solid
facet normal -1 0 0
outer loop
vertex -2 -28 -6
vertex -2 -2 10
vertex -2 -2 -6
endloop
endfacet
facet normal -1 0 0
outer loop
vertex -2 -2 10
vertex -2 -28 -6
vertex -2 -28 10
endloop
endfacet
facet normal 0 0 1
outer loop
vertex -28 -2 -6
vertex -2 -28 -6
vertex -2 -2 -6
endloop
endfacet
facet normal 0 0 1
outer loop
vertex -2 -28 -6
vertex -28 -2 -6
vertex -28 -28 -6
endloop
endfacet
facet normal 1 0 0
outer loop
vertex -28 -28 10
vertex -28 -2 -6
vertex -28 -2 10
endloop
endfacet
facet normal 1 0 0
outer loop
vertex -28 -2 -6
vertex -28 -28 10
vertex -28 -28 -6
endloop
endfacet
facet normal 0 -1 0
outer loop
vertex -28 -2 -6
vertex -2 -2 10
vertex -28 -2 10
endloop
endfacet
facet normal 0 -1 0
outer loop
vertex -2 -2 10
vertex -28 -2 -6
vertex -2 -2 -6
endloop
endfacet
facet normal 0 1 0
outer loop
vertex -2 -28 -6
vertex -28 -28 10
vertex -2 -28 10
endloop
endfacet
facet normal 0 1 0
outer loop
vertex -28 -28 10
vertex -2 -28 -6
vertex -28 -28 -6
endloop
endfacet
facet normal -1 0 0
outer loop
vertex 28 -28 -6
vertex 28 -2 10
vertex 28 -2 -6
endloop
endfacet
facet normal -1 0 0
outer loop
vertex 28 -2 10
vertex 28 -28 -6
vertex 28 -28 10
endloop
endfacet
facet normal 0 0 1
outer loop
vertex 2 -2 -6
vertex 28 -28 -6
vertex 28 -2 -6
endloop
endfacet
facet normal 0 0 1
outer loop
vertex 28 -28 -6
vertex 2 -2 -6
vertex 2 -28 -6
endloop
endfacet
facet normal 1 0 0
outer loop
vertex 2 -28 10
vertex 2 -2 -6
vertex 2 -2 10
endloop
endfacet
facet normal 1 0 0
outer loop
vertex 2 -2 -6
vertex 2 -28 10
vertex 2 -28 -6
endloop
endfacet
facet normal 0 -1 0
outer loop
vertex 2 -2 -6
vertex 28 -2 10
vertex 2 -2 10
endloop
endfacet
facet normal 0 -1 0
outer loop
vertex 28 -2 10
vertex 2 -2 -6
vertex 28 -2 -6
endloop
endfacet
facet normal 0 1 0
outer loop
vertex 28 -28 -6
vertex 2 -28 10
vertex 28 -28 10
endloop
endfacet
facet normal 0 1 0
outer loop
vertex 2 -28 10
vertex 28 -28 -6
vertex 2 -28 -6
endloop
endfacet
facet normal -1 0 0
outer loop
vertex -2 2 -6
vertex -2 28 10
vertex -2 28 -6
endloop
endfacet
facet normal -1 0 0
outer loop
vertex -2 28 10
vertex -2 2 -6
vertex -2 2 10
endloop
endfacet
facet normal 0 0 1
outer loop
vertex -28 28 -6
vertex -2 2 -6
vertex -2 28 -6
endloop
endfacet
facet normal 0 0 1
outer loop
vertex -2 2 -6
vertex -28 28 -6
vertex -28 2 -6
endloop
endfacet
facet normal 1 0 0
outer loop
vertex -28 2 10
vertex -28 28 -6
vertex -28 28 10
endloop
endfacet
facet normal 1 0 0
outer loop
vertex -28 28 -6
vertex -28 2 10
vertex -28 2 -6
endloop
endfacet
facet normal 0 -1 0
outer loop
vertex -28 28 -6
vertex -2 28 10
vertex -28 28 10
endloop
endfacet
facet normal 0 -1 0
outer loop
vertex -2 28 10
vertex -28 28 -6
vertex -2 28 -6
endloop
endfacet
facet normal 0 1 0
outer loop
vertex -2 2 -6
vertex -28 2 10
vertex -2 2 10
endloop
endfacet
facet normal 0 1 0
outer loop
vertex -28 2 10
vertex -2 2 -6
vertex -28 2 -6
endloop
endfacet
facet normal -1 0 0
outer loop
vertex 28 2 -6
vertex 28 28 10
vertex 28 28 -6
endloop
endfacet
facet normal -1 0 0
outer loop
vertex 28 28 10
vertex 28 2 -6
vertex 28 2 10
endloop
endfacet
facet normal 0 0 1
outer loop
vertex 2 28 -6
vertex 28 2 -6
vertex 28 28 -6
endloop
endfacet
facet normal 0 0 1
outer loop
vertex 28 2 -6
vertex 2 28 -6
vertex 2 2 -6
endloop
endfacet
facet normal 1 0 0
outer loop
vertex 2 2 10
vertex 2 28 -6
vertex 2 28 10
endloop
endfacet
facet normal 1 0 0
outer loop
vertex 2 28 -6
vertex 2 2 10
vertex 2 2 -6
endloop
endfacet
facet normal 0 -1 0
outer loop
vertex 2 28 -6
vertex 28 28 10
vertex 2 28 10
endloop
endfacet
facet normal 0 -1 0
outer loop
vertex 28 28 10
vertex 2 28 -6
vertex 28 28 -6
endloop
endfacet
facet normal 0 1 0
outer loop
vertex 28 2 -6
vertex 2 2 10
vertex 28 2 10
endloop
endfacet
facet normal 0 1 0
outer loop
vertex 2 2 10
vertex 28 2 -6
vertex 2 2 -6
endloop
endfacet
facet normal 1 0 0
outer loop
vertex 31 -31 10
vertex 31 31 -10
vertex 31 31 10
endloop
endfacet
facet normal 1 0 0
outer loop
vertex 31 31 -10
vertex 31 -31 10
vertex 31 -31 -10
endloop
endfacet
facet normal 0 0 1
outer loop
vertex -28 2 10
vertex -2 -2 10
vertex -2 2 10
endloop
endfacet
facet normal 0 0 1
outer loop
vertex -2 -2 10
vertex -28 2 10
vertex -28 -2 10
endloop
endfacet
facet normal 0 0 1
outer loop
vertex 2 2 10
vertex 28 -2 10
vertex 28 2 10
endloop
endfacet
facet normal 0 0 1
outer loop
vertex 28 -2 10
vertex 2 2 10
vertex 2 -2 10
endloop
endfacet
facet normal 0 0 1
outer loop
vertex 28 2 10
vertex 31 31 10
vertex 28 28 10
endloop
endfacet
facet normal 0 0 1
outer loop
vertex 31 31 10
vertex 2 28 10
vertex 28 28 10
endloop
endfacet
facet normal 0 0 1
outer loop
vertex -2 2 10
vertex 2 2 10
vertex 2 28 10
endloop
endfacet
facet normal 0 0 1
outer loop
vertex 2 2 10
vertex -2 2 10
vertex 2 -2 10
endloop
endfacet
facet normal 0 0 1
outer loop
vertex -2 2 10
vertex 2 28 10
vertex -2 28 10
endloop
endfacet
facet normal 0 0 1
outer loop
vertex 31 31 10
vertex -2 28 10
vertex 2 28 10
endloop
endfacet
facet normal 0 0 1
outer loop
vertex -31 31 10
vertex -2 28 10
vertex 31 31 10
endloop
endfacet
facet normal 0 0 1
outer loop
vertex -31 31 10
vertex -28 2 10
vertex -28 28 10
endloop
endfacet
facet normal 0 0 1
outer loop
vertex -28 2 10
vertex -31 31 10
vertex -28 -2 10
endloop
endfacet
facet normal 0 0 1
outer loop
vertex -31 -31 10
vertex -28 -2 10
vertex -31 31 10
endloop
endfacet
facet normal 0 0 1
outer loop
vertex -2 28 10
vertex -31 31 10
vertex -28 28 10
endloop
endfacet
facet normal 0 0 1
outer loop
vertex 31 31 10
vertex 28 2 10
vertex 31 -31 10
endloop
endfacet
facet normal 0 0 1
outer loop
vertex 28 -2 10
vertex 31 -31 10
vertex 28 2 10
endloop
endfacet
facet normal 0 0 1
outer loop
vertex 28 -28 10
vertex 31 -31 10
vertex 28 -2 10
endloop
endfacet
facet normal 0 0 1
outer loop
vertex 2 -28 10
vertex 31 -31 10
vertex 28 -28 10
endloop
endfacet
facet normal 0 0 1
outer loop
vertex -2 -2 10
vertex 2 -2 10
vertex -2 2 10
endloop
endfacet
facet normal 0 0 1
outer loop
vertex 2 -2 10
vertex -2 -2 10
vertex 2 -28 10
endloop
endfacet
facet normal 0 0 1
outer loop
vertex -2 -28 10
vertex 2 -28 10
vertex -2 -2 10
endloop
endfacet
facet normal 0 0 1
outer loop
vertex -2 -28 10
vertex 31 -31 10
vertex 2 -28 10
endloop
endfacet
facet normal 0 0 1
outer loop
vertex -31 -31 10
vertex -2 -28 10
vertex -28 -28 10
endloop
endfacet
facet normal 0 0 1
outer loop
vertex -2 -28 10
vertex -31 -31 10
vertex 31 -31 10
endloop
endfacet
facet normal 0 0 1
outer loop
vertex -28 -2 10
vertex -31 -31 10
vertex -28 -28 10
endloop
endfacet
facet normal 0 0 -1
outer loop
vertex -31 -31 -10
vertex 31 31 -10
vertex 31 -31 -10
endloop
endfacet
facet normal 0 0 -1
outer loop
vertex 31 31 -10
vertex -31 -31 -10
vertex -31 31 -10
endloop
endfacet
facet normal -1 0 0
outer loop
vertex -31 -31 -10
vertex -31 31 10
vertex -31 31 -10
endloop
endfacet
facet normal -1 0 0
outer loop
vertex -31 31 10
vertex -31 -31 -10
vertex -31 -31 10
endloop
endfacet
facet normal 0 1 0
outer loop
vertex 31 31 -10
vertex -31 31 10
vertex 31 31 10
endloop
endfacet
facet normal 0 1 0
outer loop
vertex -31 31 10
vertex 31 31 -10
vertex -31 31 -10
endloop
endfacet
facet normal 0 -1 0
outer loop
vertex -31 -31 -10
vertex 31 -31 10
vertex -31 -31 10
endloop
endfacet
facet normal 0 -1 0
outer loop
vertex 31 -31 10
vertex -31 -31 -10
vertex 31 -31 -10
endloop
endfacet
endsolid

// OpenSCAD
$fn = 32;

// ----------------------------------------------------------------------
// Pocket plate 62 x 62 x 20
// 2 x 2 pockets 26 mm square, 16 mm deep
// ----------------------------------------------------------------------

// --- parameters (mm) ---
thickness = 20;  // plate thickness
floor_t = 4;     // material left under each pocket
pocket = 26;     // pocket side length
pitch_x = 30;    // pocket pitch along X
pitch_y = 30;    // pocket pitch along Y
cols = 2;        // pockets per row
rows = 2;        // rows of pockets

// --- derived feature positions (mm) ---
depth = thickness - floor_t;        // = 16   pocket depth, down to the floor
span_x = (cols - 1) * pitch_x;      // = 30   distance between outer pockets
span_y = (rows - 1) * pitch_y;      // = 30   distance between outer pocket rows
origin_x = -span_x / 2;             // = -15   X of the first pocket
origin_y = -span_y / 2;             // = -15   Y of the first pocket
plate = [span_x + pocket + 6, span_y + pocket + 6, thickness];  // = [62, 62, 20]   overall size: pockets plus 3 mm of wall on each side
feature_centers = [
  [origin_x + 0 * pitch_x, origin_y + 0 * pitch_y],
  [origin_x + 1 * pitch_x, origin_y + 0 * pitch_y],
  [origin_x + 0 * pitch_x, origin_y + 1 * pitch_y],
  [origin_x + 1 * pitch_x, origin_y + 1 * pitch_y]
];   // pocket centres, used verbatim by the cutter loop

// plate outline, then one pocket per centre in feature_centers
difference() {
  cube(plate, center = true);
  for (centre = feature_centers)
    translate([centre[0] - pocket / 2, centre[1] - pocket / 2, plate[2] / 2 - depth])
      cube([pocket, pocket, depth + 1]);  // centred on the declared pocket centre
}
